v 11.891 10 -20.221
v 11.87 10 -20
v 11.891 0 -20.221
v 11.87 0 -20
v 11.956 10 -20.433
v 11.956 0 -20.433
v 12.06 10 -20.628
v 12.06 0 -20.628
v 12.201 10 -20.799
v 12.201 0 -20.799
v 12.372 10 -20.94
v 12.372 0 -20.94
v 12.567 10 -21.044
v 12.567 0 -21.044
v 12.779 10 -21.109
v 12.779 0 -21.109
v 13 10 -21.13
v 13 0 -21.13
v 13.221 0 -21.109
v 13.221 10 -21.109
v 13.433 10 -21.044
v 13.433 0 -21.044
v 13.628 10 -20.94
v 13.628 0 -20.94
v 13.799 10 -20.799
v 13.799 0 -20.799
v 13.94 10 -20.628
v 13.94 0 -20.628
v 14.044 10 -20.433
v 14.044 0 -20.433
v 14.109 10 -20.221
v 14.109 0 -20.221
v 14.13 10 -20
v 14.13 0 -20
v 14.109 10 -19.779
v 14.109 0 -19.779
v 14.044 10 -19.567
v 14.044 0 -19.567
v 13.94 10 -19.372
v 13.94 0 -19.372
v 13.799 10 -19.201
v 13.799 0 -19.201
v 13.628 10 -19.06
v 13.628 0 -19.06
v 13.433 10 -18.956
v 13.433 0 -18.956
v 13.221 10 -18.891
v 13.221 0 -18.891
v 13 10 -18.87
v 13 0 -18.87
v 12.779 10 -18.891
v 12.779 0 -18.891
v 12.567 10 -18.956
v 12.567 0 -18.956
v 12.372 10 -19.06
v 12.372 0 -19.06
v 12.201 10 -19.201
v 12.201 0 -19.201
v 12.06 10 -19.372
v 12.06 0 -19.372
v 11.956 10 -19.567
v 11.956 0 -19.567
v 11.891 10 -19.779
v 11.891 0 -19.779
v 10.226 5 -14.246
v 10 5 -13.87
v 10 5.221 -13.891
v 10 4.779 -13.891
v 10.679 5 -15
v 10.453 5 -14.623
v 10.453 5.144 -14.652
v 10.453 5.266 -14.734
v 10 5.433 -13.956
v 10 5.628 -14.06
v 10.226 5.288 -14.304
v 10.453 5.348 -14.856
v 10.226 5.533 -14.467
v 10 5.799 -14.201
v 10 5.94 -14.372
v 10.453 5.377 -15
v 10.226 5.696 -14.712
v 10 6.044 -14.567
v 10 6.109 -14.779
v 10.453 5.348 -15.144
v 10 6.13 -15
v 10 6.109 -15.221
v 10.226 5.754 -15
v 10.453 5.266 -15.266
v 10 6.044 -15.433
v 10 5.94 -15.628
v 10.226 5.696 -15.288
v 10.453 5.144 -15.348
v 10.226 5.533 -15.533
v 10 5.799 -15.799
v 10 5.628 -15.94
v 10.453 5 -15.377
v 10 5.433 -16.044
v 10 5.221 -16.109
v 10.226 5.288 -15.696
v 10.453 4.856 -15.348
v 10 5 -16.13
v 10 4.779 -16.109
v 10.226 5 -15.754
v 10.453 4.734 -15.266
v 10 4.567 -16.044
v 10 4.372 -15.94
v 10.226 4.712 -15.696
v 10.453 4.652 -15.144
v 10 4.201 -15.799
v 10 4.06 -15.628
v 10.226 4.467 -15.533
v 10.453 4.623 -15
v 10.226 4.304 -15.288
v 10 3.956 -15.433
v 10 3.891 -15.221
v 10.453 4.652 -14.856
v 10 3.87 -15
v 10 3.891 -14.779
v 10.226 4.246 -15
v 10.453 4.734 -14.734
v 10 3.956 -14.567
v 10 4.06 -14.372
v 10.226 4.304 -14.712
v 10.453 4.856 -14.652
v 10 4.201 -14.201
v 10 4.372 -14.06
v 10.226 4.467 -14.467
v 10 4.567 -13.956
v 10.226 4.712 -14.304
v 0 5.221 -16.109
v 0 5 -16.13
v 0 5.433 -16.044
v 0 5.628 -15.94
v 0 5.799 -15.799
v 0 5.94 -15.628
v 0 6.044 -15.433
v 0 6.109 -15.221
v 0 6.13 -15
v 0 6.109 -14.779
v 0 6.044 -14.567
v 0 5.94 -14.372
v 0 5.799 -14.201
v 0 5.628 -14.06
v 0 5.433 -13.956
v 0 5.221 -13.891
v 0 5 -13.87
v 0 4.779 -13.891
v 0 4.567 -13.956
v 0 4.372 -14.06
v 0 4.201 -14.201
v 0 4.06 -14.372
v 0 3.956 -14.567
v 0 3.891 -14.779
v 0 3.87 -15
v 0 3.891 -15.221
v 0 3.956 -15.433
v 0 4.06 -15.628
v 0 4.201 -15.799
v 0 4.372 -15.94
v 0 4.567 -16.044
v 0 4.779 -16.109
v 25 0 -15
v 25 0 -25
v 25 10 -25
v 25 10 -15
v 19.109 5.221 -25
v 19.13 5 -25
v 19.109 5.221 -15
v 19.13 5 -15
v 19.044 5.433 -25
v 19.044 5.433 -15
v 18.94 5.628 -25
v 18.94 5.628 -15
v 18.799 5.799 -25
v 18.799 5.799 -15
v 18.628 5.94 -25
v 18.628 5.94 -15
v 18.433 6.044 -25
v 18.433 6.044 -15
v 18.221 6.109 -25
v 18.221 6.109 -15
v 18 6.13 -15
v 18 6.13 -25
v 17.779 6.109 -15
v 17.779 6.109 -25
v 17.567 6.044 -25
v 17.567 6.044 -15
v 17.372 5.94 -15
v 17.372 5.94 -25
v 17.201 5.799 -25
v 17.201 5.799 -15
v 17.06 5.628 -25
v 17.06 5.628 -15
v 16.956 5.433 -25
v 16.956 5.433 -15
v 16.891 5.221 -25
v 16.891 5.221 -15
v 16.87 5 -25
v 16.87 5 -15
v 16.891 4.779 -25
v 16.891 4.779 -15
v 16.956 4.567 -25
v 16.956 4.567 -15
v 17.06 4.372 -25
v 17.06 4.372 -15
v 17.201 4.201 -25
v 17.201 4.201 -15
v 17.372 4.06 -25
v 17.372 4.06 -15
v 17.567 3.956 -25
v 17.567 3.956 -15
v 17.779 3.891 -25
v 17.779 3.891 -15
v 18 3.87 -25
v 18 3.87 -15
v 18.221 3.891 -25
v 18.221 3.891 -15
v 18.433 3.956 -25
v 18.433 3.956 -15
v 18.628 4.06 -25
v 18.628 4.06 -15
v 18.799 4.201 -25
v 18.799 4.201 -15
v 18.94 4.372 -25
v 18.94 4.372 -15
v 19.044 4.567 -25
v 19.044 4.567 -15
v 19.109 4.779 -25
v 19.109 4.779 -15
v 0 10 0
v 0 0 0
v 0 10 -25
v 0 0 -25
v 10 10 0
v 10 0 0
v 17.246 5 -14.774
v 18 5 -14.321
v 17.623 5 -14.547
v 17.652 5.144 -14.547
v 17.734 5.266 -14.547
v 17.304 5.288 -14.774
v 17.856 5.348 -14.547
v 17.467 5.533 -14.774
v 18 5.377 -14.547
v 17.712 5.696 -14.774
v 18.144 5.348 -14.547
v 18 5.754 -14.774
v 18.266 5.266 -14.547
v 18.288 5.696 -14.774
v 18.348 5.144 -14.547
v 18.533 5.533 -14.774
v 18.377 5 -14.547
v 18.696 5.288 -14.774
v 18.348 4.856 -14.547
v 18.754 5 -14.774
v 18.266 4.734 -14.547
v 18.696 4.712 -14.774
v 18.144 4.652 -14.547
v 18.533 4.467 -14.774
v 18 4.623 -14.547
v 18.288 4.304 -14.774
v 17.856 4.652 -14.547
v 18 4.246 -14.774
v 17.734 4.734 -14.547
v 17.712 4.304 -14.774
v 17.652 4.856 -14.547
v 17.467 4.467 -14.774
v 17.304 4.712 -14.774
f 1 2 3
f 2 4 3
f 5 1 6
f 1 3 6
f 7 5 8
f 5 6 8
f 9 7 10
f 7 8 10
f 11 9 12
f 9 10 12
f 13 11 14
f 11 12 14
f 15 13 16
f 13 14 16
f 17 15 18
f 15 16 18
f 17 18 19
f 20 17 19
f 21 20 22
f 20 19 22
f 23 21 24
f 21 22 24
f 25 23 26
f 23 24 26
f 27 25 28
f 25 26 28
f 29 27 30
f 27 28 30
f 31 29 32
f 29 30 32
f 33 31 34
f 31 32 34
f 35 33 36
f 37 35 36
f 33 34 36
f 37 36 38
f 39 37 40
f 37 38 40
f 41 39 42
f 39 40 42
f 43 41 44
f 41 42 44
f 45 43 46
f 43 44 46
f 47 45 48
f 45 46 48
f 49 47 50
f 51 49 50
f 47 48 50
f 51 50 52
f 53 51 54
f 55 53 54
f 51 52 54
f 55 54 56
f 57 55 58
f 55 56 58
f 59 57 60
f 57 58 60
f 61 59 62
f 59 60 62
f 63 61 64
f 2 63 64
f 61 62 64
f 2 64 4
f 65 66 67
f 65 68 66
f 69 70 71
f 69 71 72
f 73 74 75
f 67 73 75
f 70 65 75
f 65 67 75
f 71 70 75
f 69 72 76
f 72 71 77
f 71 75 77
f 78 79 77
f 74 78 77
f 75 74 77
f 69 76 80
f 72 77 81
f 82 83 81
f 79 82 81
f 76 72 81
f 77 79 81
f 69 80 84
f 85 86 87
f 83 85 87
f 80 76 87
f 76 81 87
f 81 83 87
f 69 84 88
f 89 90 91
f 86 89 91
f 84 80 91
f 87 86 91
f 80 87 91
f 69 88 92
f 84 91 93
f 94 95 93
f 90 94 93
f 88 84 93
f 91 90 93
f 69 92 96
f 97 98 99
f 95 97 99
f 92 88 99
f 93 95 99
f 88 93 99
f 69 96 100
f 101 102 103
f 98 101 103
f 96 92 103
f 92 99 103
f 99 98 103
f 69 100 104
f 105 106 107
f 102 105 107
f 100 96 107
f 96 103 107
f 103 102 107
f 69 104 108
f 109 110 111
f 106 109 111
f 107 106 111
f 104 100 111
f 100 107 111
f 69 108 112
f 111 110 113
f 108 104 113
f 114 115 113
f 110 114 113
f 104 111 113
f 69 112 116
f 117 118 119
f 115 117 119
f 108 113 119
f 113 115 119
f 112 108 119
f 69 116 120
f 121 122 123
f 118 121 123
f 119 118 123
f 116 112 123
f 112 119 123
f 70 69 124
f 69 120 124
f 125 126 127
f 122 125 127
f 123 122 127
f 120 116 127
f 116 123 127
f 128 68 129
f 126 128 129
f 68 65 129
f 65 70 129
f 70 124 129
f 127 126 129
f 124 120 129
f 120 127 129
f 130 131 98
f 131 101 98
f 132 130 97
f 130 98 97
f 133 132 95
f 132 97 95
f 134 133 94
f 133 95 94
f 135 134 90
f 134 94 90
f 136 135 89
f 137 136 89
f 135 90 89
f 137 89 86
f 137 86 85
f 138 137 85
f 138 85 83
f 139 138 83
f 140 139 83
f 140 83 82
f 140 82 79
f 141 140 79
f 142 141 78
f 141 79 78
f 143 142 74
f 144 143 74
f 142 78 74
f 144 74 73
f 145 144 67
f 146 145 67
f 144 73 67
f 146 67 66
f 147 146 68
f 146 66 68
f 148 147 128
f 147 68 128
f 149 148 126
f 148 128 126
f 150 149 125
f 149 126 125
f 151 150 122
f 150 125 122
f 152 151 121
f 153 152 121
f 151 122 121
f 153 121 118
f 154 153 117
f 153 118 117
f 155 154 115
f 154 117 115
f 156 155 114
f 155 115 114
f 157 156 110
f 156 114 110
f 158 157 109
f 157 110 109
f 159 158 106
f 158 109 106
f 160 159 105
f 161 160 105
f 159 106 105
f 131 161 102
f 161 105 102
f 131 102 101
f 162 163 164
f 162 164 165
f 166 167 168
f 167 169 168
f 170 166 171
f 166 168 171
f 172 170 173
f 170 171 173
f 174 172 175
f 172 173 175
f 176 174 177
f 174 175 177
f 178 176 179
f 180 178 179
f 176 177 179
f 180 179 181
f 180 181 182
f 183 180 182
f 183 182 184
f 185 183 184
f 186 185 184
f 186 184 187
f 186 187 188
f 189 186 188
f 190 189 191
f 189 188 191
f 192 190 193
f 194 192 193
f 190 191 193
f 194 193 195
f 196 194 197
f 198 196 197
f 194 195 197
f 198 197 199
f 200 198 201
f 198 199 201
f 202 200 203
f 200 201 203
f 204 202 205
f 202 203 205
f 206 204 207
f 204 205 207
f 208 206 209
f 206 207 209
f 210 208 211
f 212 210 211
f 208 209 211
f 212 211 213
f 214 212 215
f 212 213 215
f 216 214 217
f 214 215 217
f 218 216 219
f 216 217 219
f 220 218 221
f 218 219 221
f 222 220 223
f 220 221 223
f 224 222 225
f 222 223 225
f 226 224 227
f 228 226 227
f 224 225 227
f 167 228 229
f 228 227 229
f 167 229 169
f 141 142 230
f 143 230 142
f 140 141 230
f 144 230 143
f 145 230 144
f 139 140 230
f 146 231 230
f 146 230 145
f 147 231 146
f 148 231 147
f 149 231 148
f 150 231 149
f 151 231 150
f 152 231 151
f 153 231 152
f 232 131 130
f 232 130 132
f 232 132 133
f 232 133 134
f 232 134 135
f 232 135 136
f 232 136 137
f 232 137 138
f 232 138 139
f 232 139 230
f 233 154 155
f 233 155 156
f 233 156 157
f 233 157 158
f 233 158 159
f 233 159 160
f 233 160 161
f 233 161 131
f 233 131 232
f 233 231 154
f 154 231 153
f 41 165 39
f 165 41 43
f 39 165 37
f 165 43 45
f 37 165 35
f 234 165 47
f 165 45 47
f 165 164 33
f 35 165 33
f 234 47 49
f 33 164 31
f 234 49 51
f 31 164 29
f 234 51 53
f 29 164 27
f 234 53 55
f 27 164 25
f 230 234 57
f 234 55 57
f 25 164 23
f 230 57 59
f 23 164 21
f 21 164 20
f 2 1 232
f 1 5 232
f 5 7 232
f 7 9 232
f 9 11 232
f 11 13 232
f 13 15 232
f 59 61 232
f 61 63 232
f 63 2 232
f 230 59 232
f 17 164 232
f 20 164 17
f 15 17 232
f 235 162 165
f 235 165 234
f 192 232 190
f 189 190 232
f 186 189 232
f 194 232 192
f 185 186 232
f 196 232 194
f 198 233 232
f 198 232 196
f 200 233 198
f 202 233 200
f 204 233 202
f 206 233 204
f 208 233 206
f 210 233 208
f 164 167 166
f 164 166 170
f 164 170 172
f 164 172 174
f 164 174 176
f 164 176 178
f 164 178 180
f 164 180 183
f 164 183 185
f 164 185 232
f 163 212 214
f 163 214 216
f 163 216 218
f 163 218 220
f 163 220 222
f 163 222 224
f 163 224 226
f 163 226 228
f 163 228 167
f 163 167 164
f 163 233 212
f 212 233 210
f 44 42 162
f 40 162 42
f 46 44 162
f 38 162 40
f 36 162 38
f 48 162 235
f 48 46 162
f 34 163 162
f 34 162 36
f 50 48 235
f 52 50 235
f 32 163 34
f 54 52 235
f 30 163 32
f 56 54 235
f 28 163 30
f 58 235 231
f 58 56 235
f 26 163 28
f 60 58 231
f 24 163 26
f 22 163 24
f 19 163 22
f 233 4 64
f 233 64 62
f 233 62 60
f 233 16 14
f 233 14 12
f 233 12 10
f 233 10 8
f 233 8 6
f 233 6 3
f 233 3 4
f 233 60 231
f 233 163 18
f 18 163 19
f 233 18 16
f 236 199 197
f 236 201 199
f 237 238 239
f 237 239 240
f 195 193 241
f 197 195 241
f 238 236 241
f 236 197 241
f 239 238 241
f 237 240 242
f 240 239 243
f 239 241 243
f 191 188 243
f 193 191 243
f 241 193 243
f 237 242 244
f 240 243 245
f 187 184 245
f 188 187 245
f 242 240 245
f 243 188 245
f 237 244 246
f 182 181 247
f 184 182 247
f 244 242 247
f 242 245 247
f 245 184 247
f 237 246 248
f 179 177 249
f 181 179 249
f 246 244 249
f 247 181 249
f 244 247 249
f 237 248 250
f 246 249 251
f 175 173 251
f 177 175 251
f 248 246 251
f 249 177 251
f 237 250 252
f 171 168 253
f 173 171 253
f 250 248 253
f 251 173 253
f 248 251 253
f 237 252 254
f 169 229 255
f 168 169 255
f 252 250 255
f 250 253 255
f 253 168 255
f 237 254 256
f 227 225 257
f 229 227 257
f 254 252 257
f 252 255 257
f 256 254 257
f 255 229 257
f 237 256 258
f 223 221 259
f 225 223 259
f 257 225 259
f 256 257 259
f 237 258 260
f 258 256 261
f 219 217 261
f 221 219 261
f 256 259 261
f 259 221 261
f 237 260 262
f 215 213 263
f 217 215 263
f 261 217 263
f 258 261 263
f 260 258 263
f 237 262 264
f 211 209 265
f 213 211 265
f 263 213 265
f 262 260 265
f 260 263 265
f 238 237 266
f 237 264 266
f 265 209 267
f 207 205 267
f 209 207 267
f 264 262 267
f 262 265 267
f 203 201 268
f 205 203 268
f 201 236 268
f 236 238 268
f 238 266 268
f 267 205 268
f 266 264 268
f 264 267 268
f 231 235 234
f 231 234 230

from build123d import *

# Parameters (mm, degrees)
BOSS_EXTRUDE1_DEPTH       = 10
F_4_40_TAPPED_HOLE1_D     = 2.2606
F_4_40_TAPPED_HOLE1_DEPTH = 10
F_4_40_TAPPED_HOLE1_TIP   = 0.679152758
F_4_40_TAPPED_HOLE2_D     = 2.2606
F_4_40_TAPPED_HOLE2_DEPTH = 10
F_4_40_TAPPED_HOLE2_TIP   = 0.679152758
F_4_40_TAPPED_HOLE3_D     = 2.2606
F_4_40_TAPPED_HOLE3_DEPTH = 10
F_4_40_TAPPED_HOLE3_TIP   = 0.679152758


with BuildPart() as part:
    # Sketch1 → Boss-Extrude1 (new body)
    with BuildSketch(Plane(origin=(0, 0, 0), x_dir=(1, 0, 0), z_dir=(0, 1, 0))):
        Polygon((0, 0), (0, 25), (25, 25), (25, 15), (10, 0), align=None)
    extrude(amount=BOSS_EXTRUDE1_DEPTH)

    # #4-40 Tapped Hole1
    with Locations(Plane.ZY):
        with Locations((-15, 5)):
            Hole(F_4_40_TAPPED_HOLE1_D / 2, depth=F_4_40_TAPPED_HOLE1_DEPTH)
            with Locations((0, 0, -(F_4_40_TAPPED_HOLE1_DEPTH + F_4_40_TAPPED_HOLE1_TIP / 2))):  # 118° drill point
                Cone(0, F_4_40_TAPPED_HOLE1_D / 2, F_4_40_TAPPED_HOLE1_TIP, mode=Mode.SUBTRACT)

    # #4-40 Tapped Hole2
    with Locations(Plane(origin=(0, 10, 0), x_dir=(1, 0, 0), z_dir=(0, 1, 0))):
        with Locations((13, 20)):
            Hole(F_4_40_TAPPED_HOLE2_D / 2, depth=F_4_40_TAPPED_HOLE2_DEPTH)
            with Locations((0, 0, -(F_4_40_TAPPED_HOLE2_DEPTH + F_4_40_TAPPED_HOLE2_TIP / 2))):  # 118° drill point
                Cone(0, F_4_40_TAPPED_HOLE2_D / 2, F_4_40_TAPPED_HOLE2_TIP, mode=Mode.SUBTRACT)

    # #4-40 Tapped Hole3
    with Locations(Plane(origin=(0, 0, -25), x_dir=(-1, 0, 0), z_dir=(0, 0, -1))):
        with Locations((-18, 5)):
            Hole(F_4_40_TAPPED_HOLE3_D / 2, depth=F_4_40_TAPPED_HOLE3_DEPTH)
            with Locations((0, 0, -(F_4_40_TAPPED_HOLE3_DEPTH + F_4_40_TAPPED_HOLE3_TIP / 2))):  # 118° drill point
                Cone(0, F_4_40_TAPPED_HOLE3_D / 2, F_4_40_TAPPED_HOLE3_TIP, mode=Mode.SUBTRACT)


solid = part.part
